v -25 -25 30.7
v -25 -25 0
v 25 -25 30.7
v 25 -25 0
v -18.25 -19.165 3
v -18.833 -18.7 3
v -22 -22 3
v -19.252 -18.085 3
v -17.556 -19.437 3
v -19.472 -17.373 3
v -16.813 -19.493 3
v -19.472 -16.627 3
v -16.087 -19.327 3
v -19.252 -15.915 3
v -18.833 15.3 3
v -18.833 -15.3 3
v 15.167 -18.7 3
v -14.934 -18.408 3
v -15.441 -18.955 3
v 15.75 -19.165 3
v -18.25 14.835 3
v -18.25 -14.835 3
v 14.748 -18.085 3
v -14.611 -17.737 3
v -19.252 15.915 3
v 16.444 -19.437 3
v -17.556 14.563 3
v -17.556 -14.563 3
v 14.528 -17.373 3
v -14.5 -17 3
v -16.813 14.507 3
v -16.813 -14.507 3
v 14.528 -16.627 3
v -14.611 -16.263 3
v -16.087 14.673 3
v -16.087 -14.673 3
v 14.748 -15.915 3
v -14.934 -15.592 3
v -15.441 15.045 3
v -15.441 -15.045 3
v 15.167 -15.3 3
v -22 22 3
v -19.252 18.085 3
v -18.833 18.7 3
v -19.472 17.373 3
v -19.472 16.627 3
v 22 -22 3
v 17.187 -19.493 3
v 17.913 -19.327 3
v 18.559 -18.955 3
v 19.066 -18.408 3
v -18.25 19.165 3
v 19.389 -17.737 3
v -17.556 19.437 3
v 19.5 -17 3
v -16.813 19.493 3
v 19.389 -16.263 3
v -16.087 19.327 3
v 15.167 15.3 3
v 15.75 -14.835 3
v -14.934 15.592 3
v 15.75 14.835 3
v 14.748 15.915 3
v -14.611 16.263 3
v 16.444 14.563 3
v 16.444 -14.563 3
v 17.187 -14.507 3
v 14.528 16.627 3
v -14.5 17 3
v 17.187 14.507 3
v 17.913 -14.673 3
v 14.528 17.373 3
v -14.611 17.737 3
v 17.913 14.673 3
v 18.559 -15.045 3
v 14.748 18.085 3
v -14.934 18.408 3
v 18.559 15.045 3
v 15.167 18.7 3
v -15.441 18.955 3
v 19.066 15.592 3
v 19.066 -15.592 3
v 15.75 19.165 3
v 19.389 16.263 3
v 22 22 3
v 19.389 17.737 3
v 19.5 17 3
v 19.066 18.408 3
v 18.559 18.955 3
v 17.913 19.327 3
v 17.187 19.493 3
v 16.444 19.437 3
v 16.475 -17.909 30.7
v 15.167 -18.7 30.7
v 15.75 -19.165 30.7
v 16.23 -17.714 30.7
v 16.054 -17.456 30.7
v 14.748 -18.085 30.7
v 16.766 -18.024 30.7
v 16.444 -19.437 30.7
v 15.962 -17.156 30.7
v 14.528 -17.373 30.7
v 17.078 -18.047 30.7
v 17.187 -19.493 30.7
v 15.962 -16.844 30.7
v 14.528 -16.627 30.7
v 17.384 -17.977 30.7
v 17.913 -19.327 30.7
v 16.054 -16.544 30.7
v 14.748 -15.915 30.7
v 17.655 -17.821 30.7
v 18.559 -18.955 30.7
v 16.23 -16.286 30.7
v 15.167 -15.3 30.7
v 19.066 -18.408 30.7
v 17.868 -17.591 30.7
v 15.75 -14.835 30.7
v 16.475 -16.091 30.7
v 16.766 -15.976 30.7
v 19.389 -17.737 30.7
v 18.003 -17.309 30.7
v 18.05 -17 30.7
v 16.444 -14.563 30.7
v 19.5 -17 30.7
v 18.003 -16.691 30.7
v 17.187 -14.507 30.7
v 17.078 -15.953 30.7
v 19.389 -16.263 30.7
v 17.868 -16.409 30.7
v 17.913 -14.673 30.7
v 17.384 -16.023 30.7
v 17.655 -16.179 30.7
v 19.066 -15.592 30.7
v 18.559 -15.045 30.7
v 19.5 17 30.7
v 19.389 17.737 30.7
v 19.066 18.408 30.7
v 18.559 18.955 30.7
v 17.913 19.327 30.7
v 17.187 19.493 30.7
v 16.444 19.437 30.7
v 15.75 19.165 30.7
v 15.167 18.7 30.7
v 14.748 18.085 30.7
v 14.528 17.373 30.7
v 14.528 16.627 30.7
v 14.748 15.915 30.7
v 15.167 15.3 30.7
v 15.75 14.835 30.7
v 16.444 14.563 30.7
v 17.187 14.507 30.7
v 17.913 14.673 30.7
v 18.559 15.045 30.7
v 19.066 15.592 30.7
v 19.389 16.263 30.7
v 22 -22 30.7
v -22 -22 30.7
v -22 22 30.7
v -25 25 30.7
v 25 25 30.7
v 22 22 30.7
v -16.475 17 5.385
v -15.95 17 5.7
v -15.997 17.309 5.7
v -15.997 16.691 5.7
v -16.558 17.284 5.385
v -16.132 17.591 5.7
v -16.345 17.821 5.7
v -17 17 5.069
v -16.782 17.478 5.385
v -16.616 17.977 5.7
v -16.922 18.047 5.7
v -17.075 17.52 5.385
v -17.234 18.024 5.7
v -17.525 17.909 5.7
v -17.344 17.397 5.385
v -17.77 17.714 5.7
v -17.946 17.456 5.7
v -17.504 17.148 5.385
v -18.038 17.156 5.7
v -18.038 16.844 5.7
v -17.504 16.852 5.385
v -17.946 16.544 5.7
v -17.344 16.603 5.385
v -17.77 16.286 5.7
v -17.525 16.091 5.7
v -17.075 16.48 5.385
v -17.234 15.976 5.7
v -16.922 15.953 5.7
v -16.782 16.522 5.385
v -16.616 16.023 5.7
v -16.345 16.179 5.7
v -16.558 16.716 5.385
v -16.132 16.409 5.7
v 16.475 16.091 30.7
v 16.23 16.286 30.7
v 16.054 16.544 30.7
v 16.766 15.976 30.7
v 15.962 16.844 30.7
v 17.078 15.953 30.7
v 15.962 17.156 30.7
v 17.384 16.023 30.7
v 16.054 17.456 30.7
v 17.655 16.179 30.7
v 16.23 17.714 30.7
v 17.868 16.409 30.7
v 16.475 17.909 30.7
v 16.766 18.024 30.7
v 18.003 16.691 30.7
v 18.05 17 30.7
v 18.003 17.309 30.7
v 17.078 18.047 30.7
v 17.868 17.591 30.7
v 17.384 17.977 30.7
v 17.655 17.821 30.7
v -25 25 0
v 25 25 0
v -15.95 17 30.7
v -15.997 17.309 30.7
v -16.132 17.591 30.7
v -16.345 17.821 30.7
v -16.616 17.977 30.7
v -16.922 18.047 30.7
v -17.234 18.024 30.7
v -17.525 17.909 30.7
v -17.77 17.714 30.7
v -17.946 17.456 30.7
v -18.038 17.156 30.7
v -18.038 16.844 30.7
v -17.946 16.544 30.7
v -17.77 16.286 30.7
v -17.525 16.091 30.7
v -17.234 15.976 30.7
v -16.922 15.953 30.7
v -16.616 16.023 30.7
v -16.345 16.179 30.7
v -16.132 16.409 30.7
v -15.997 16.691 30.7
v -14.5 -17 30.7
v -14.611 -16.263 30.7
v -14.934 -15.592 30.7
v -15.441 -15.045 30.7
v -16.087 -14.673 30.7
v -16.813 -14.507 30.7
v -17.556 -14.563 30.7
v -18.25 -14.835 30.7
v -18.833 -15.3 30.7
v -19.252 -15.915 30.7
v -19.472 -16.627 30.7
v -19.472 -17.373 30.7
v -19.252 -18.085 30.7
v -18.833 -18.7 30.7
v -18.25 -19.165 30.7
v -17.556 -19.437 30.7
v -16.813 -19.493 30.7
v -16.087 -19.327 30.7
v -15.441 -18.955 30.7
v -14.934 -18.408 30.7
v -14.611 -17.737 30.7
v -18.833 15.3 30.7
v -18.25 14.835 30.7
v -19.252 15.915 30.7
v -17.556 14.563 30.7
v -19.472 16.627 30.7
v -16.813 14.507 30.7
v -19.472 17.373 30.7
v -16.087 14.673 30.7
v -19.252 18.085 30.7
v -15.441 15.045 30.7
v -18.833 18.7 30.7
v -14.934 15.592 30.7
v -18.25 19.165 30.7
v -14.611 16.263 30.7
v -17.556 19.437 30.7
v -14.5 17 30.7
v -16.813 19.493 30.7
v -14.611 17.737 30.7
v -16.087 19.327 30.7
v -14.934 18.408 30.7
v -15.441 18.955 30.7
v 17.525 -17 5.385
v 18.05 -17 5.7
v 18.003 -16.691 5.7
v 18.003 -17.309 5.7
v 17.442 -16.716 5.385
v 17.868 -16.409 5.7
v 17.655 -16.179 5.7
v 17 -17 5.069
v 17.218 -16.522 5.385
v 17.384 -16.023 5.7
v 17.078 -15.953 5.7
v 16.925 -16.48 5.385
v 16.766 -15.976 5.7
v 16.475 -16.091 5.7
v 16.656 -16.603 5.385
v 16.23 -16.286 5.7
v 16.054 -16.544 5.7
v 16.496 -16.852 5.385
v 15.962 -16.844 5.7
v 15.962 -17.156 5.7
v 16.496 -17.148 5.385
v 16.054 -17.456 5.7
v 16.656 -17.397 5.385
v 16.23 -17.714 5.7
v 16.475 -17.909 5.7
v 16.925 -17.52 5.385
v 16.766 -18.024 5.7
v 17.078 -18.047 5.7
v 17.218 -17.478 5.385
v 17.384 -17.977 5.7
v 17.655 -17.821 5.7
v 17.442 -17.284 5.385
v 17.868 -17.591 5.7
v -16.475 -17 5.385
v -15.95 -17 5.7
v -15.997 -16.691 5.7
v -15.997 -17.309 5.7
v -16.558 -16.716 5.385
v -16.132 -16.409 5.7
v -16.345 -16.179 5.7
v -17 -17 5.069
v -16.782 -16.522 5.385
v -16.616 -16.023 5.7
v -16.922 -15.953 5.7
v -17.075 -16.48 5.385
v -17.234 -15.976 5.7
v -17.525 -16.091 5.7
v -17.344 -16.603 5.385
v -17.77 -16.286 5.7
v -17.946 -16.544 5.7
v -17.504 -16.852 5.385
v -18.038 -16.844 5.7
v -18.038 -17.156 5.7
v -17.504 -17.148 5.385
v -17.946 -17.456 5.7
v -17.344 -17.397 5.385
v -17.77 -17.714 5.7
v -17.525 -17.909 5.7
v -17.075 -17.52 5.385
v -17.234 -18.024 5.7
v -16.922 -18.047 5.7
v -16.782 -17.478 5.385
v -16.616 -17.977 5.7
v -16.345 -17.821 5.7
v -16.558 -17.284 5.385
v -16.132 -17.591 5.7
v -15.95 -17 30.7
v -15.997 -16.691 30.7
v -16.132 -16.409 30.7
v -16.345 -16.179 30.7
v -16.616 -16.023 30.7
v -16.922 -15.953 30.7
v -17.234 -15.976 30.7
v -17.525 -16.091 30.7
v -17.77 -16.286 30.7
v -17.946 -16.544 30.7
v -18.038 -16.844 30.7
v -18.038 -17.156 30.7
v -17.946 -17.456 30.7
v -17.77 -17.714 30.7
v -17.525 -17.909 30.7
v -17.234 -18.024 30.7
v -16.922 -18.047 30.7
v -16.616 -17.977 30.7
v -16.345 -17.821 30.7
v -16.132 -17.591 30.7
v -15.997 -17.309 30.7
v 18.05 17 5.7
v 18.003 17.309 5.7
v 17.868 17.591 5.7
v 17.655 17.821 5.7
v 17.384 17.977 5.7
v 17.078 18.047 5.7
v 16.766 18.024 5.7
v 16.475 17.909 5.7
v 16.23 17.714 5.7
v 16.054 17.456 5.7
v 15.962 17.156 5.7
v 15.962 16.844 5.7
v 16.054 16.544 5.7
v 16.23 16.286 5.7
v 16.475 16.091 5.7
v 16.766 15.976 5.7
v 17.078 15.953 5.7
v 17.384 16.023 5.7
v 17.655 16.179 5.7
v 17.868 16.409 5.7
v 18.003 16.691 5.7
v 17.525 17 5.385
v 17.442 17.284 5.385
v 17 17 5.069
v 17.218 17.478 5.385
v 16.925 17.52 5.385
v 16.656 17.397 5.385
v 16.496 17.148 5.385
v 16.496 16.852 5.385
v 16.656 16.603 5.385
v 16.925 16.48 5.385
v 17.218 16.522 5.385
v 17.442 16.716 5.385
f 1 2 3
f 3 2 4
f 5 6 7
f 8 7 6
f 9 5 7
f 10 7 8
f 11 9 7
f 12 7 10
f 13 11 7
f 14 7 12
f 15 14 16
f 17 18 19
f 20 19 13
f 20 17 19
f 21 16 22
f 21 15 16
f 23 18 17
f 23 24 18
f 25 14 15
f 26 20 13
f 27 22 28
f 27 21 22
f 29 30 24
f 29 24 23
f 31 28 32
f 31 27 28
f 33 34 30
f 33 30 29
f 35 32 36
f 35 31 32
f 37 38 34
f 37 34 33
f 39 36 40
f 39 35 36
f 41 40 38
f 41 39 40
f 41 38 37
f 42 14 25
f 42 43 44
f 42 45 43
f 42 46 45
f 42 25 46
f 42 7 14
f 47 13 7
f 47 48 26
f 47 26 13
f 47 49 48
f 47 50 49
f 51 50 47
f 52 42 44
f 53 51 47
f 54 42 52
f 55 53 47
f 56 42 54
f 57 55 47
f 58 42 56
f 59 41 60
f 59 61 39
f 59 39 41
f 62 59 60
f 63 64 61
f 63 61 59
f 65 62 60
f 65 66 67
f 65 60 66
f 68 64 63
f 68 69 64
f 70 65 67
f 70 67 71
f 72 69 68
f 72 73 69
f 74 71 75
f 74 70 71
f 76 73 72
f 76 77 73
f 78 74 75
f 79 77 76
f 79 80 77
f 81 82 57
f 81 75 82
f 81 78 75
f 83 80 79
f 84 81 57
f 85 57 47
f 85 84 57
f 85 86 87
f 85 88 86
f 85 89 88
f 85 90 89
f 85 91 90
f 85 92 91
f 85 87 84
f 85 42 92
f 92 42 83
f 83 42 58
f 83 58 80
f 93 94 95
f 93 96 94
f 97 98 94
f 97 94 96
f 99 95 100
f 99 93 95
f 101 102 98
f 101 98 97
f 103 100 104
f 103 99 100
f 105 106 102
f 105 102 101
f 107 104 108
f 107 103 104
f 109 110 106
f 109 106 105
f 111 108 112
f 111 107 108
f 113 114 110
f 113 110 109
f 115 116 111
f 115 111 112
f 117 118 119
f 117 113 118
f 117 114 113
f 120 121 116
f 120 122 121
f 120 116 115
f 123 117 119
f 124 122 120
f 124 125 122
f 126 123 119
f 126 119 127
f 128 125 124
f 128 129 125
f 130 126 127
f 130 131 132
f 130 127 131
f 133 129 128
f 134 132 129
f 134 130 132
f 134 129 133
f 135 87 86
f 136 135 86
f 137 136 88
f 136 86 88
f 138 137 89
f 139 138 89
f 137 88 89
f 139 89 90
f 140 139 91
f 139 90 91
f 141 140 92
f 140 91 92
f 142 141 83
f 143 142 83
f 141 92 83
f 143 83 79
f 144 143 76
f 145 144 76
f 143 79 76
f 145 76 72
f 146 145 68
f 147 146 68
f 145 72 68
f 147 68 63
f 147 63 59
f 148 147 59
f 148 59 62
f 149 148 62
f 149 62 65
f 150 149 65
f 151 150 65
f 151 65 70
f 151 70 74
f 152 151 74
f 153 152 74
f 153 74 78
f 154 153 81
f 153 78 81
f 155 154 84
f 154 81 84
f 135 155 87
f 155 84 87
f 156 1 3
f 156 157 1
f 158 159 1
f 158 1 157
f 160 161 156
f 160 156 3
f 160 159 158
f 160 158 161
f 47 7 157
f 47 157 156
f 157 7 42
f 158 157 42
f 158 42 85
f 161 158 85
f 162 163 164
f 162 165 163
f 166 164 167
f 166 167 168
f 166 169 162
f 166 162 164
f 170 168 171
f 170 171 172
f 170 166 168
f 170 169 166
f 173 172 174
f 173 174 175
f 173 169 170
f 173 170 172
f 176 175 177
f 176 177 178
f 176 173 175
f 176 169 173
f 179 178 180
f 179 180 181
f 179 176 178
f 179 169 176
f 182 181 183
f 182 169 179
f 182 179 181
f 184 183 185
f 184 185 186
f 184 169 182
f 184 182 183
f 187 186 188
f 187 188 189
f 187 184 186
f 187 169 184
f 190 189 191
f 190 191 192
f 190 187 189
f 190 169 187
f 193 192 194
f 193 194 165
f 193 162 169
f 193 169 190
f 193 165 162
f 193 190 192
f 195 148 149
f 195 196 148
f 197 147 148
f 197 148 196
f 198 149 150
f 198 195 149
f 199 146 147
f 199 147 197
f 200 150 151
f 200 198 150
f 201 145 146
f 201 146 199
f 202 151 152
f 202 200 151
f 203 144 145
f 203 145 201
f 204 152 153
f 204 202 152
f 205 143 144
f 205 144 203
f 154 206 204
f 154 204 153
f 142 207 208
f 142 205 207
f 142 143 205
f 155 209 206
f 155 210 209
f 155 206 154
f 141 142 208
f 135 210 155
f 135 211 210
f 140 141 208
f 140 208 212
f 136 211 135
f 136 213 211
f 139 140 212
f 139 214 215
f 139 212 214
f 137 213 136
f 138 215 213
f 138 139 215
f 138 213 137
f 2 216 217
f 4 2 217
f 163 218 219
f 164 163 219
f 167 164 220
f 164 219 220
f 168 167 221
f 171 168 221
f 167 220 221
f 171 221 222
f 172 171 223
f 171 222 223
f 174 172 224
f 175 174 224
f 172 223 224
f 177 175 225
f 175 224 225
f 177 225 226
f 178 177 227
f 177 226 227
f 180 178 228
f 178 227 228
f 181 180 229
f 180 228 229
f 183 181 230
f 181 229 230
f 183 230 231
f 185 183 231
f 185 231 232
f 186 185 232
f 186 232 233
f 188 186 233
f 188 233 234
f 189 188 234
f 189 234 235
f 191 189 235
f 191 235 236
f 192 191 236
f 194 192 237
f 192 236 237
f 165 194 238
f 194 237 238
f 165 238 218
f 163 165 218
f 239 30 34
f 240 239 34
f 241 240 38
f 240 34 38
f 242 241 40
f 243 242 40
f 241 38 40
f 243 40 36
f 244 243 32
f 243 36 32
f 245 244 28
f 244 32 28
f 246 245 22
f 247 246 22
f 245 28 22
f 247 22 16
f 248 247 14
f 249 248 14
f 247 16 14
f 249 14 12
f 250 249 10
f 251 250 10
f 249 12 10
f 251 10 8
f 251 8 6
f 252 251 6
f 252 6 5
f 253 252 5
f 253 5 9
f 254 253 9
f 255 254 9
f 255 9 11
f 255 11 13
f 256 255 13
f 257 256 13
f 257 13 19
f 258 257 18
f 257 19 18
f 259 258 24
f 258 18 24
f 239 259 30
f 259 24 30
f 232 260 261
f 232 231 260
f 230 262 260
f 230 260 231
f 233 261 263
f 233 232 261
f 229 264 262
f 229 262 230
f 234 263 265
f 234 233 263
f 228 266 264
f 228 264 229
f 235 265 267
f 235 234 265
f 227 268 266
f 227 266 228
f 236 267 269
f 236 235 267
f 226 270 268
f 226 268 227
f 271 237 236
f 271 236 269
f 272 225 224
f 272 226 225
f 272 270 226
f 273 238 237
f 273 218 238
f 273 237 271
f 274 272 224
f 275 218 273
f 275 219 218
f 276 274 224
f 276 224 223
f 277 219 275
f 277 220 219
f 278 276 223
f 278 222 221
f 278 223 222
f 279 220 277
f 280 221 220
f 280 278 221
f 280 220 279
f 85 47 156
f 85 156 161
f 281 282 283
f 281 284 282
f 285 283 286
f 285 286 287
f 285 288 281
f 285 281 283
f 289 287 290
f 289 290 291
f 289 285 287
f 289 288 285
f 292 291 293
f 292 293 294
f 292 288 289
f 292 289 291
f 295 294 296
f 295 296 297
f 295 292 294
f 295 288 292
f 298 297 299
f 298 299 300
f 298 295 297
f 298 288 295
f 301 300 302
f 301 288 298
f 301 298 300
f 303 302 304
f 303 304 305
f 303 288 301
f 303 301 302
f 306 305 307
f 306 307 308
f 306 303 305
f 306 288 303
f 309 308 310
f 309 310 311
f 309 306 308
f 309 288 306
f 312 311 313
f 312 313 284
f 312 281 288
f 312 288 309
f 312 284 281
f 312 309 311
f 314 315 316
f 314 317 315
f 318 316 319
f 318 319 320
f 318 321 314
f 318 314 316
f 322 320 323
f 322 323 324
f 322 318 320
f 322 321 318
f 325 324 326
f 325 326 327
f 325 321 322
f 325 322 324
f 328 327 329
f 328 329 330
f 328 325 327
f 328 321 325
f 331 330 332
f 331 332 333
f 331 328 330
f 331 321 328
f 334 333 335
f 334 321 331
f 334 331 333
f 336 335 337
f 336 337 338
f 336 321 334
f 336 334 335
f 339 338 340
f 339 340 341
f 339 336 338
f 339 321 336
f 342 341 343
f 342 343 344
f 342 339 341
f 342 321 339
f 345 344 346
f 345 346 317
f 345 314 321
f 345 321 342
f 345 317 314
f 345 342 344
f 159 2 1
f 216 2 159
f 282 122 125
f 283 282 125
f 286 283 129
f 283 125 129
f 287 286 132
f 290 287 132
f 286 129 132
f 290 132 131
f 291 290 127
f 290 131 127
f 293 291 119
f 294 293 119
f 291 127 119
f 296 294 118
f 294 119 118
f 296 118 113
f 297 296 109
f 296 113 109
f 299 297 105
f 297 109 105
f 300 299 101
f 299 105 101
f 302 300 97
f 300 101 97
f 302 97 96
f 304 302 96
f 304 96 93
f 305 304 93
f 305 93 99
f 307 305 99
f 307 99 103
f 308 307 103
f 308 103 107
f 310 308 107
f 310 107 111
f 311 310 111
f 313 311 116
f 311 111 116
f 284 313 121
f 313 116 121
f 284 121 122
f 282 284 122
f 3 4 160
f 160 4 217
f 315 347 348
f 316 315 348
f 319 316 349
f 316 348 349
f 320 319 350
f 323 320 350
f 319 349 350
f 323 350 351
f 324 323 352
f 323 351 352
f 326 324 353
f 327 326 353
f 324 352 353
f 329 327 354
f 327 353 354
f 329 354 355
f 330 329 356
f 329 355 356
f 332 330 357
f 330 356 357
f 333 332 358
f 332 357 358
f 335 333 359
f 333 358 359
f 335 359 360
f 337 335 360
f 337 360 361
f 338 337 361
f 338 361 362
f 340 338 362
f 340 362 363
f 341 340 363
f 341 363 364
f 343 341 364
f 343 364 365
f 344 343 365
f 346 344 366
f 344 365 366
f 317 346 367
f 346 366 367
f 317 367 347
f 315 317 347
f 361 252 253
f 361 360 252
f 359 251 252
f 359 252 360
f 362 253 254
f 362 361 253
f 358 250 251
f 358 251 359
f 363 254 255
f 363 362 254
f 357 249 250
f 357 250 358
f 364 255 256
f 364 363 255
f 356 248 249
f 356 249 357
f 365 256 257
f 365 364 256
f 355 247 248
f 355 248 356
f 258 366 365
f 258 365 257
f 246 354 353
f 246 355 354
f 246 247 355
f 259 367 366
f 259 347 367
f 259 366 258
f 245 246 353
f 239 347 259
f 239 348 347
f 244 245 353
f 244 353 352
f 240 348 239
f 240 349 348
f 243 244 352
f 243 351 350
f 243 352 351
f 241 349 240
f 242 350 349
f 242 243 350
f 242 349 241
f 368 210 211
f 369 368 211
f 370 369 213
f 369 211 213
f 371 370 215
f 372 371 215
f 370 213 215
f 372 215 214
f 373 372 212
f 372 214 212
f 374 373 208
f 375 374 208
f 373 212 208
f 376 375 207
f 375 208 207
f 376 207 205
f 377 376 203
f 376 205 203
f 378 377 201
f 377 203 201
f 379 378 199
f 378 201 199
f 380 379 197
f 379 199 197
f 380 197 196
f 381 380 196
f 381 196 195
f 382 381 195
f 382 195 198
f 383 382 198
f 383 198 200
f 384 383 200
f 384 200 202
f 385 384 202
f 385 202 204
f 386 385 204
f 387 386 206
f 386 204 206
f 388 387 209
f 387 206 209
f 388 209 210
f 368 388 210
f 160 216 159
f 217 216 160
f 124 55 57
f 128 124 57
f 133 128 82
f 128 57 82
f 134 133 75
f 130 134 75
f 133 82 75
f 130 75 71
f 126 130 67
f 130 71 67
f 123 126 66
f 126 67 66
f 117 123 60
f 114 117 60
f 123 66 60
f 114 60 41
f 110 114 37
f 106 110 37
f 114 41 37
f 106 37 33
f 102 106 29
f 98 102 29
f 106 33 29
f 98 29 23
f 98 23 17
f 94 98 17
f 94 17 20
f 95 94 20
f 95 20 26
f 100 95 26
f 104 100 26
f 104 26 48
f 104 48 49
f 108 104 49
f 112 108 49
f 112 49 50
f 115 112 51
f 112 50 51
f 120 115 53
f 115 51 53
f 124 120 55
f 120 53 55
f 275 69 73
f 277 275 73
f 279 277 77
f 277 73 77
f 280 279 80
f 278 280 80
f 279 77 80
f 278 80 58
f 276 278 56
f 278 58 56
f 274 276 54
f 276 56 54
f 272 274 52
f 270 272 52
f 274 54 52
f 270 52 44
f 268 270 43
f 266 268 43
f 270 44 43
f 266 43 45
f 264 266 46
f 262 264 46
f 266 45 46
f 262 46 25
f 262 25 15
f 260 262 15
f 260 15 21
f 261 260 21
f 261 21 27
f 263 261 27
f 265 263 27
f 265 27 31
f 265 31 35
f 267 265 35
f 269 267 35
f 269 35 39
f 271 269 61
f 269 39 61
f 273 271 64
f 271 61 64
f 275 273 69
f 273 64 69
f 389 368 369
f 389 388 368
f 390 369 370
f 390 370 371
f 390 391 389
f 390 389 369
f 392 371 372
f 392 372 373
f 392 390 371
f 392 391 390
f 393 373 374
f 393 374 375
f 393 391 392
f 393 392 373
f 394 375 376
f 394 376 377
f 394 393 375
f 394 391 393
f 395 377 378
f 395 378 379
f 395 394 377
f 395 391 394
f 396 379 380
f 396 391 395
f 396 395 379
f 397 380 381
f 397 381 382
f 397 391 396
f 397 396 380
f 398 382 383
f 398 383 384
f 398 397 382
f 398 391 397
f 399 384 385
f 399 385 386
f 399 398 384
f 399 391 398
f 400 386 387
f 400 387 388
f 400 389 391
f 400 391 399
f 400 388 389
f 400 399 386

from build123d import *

# Parameters (mm, degrees)
SKETCH_W      = 50
SKETCH_H      = 50
PAD_DEPTH     = 3
SKETCH001_W   = 50
SKETCH001_H   = 50
SKETCH001_W_2 = 44
SKETCH001_H_2 = 44
PAD001_DEPTH  = 27.7
SKETCH002_R   = 2.5
PAD002_DEPTH  = 27.7
SKETCH003_R   = 1.05
HOLE_DEPTH    = 25
HOLE_TIPS_R   = 1.05


with BuildPart() as part:
    # Sketch → Pad (new body)
    with BuildSketch(Plane.XY):
        Rectangle(SKETCH_W, SKETCH_H)
    extrude(amount=PAD_DEPTH)

    # Sketch001 (on Face6 of Pad) → Pad001 (join)
    with BuildSketch(Plane.XY.offset(3)):
        Rectangle(SKETCH001_W, SKETCH001_H)
        Rectangle(SKETCH001_W_2, SKETCH001_H_2, mode=Mode.SUBTRACT)
    extrude(amount=PAD001_DEPTH)

    # Sketch002 (on Face15 of Pad001) → Pad002 (join)
    with BuildSketch(Plane.XY.offset(3)):
        with Locations((-17, 17)):
            Circle(SKETCH002_R)
        with Locations((17, 17)):
            Circle(SKETCH002_R)
        with Locations((17, -17)):
            Circle(SKETCH002_R)
        with Locations((-17, -17)):
            Circle(SKETCH002_R)
    extrude(amount=PAD002_DEPTH)

    # Sketch003 (on Face22 of Pad002) → Hole (cut)
    with BuildSketch(Plane.XY.offset(30.7)):
        with Locations((-17, 17)):
            Circle(SKETCH003_R)
        with Locations((17, 17)):
            Circle(SKETCH003_R)
        with Locations((-17, -17)):
            Circle(SKETCH003_R)
        with Locations((17, -17)):
            Circle(SKETCH003_R)
    extrude(amount=-HOLE_DEPTH, mode=Mode.SUBTRACT)

    # Hole tips → Hole tip 1 section 0
    with BuildSketch(Plane.XY.offset(5.7), mode=Mode.PRIVATE) as hole_tip_1_s0:
        with Locations((-17, 17)):
            Circle(HOLE_TIPS_R)
    loft([hole_tip_1_s0.sketch, Vertex(-17, 17, 5.069096)], mode=Mode.SUBTRACT)

    # Hole tips → Hole tip 2 section 0
    with BuildSketch(Plane.XY.offset(5.7), mode=Mode.PRIVATE) as hole_tip_2_s0:
        with Locations((17, 17)):
            Circle(HOLE_TIPS_R)
    loft([hole_tip_2_s0.sketch, Vertex(17, 17, 5.069096)], mode=Mode.SUBTRACT)

    # Hole tips → Hole tip 3 section 0
    with BuildSketch(Plane.XY.offset(5.7), mode=Mode.PRIVATE) as hole_tip_3_s0:
        with Locations((-17, -17)):
            Circle(HOLE_TIPS_R)
    loft([hole_tip_3_s0.sketch, Vertex(-17, -17, 5.069096)], mode=Mode.SUBTRACT)

    # Hole tips → Hole tip 4 section 0
    with BuildSketch(Plane.XY.offset(5.7), mode=Mode.PRIVATE) as hole_tip_4_s0:
        with Locations((17, -17)):
            Circle(HOLE_TIPS_R)
    loft([hole_tip_4_s0.sketch, Vertex(17, -17, 5.069096)], mode=Mode.SUBTRACT)


solid = part.part
